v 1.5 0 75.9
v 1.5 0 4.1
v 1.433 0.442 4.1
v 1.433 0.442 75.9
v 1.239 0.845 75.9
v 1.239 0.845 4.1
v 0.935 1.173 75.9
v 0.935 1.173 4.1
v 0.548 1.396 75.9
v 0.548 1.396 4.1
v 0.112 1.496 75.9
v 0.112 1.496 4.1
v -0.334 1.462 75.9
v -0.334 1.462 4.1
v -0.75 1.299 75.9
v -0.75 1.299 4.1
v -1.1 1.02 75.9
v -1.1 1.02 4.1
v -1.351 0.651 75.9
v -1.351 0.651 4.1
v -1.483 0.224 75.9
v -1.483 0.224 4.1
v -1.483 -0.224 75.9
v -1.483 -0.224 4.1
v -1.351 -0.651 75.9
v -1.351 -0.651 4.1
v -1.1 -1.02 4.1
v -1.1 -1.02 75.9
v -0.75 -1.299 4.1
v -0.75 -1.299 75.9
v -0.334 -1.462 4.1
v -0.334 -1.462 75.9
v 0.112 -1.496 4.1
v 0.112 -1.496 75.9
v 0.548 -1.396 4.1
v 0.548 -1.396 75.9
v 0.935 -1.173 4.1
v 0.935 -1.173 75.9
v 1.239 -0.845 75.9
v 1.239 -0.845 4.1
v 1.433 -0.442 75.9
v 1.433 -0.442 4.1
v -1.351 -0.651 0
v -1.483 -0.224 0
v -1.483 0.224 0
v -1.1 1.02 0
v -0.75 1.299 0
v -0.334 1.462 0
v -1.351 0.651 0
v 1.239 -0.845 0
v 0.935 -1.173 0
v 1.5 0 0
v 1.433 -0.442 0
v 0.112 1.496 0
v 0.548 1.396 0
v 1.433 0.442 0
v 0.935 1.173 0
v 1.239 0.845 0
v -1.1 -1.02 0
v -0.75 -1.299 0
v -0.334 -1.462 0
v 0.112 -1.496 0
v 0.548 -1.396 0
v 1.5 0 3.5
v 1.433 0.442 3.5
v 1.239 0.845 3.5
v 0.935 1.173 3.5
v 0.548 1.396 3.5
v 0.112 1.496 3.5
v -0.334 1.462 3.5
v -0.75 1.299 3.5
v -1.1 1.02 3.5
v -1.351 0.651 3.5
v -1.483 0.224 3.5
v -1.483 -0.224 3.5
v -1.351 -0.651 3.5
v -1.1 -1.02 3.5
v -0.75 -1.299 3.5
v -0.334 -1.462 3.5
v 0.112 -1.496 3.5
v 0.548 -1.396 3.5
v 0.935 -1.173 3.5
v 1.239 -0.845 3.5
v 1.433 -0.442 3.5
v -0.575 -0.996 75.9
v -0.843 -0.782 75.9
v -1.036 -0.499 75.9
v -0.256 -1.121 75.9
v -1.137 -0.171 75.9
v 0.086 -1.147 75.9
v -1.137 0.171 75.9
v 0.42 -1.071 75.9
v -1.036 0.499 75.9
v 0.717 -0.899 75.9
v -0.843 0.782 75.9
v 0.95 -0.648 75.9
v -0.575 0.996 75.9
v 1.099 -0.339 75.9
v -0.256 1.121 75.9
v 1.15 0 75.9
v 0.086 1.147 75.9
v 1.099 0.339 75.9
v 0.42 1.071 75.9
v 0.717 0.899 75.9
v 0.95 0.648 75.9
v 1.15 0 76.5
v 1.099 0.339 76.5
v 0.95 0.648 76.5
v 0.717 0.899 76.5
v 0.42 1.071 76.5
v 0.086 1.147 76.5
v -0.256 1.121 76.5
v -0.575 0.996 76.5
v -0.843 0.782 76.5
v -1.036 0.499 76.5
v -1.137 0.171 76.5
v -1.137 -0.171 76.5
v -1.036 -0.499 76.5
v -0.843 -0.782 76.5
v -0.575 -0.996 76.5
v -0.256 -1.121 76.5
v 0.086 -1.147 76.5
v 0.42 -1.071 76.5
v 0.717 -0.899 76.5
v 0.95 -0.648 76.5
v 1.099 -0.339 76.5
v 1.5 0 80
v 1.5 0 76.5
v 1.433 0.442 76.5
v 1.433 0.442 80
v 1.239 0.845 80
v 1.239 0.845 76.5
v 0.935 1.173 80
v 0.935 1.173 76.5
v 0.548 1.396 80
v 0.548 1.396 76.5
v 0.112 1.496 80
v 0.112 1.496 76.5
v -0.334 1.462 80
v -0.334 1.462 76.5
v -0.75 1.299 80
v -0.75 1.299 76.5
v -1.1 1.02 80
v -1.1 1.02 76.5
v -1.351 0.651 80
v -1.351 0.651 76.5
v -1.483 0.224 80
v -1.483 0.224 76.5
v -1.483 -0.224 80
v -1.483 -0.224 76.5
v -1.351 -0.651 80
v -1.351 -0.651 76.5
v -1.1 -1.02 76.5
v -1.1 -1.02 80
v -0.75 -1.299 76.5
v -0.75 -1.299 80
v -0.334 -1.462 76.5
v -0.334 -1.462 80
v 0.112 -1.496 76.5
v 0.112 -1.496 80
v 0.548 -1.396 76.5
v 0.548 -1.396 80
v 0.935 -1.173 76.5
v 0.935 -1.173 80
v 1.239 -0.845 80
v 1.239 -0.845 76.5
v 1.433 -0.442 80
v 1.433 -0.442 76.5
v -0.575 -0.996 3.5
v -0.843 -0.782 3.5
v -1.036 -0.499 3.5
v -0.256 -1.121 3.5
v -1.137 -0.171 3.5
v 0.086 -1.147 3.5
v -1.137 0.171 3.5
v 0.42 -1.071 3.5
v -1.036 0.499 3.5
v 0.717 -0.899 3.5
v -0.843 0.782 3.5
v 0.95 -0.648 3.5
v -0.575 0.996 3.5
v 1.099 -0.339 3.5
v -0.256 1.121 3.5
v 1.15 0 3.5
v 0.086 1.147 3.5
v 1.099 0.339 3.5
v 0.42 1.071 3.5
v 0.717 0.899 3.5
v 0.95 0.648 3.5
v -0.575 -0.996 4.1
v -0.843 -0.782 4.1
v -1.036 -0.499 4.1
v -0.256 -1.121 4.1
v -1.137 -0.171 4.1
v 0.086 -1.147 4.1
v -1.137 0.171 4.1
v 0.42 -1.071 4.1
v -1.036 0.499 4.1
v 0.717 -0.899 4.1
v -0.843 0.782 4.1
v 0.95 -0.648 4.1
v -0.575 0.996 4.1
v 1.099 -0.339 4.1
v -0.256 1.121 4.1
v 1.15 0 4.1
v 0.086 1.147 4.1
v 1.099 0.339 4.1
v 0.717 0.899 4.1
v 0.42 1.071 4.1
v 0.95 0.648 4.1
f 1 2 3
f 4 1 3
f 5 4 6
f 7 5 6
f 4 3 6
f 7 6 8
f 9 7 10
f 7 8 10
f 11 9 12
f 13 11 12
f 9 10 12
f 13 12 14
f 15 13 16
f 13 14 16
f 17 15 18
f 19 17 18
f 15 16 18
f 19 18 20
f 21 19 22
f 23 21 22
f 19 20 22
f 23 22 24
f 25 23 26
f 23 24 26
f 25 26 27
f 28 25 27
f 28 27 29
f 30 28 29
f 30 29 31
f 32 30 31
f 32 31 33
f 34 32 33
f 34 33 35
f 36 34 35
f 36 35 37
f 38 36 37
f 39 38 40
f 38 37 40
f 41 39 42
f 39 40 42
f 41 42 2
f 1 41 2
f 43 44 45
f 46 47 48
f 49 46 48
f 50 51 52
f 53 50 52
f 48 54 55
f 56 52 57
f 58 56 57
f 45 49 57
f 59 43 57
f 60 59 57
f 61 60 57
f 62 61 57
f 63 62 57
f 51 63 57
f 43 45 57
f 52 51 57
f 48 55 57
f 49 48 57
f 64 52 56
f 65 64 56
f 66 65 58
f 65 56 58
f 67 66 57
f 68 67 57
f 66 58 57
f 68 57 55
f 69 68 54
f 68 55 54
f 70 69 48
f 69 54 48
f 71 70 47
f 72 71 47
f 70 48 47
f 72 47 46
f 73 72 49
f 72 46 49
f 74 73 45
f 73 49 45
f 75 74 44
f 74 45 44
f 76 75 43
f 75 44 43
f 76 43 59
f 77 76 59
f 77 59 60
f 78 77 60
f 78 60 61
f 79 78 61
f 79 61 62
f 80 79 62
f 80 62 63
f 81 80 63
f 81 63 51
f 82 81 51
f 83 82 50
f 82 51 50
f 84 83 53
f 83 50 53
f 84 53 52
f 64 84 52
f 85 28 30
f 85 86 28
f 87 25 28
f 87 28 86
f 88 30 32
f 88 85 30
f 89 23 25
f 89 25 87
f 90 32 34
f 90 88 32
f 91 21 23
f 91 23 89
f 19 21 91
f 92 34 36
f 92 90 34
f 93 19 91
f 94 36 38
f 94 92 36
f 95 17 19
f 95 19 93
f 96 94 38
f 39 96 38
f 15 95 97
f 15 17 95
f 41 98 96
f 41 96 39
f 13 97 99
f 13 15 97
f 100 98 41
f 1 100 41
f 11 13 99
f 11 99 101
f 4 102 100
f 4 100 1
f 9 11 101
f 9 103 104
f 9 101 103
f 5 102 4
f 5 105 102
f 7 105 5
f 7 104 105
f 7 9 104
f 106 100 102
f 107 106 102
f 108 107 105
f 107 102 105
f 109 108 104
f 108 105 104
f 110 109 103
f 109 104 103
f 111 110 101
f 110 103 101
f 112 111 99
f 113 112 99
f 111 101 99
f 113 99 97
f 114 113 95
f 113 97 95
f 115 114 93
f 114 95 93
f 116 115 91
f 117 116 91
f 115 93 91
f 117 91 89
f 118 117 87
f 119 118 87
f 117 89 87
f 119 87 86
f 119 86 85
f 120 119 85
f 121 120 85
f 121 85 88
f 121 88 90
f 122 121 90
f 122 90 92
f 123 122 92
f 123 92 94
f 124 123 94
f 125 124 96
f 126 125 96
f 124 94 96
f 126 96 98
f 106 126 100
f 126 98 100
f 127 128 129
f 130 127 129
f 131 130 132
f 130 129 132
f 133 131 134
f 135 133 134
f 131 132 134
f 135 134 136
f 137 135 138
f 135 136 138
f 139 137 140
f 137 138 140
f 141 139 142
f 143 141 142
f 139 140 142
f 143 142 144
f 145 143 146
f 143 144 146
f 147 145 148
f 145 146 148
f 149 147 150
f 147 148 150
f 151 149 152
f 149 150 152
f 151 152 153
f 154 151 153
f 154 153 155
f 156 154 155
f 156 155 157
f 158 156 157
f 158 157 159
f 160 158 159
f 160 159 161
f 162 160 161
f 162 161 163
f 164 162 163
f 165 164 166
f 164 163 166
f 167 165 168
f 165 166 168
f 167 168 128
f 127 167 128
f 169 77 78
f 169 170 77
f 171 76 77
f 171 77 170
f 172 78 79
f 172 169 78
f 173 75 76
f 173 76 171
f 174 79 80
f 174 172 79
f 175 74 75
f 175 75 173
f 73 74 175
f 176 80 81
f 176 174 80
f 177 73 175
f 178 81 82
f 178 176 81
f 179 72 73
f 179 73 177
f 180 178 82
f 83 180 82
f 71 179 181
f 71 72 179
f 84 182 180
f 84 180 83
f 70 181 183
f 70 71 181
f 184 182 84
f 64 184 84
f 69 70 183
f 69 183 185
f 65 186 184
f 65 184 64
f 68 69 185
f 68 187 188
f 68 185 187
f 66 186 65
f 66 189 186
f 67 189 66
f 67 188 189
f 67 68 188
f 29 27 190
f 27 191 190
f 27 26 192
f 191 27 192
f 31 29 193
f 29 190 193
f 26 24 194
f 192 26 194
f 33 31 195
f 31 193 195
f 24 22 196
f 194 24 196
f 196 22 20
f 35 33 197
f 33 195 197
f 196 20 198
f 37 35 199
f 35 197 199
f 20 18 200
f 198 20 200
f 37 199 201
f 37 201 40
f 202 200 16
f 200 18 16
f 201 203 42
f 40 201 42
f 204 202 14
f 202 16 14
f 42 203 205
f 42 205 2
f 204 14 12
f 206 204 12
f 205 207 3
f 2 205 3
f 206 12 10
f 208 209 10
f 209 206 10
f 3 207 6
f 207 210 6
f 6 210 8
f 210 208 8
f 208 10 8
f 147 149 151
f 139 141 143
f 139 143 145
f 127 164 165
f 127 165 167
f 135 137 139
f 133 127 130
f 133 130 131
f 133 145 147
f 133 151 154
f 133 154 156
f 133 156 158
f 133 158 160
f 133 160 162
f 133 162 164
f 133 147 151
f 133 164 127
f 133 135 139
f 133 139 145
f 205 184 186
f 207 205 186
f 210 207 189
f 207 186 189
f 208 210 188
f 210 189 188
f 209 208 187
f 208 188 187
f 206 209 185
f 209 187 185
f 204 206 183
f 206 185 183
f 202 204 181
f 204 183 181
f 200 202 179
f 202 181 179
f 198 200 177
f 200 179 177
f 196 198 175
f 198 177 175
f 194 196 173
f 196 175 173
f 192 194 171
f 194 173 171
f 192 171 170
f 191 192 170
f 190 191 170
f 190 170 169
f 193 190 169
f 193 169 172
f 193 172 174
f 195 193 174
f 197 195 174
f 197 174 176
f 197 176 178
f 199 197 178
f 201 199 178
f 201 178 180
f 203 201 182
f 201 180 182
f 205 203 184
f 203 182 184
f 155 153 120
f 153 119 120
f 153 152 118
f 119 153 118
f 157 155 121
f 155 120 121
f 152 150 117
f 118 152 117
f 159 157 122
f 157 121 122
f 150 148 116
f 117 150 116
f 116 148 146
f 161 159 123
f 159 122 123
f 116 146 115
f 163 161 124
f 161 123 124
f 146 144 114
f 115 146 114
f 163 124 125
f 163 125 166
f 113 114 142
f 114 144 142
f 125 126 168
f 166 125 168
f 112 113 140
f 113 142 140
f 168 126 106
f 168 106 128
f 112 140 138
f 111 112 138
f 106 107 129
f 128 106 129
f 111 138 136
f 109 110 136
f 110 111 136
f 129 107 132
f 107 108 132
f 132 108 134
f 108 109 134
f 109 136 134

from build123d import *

# Parameters (mm, degrees)
SKETCH_1_R      = 1.5
EXTRUDE_1_DEPTH = 3.5
SKETCH_2_R      = 1.15
EXTRUDE_2_DEPTH = 0.6
SKETCH_3_R      = 1.5
EXTRUDE_3_DEPTH = 71.8
SKETCH_4_R      = 1.15
EXTRUDE_4_DEPTH = 0.6
SKETCH_5_R      = 1.5
EXTRUDE_5_DEPTH = 3.5


with BuildPart() as part:
    # 草图1 → 凸台-拉伸1 (new body)
    with BuildSketch(Plane.XY):
        Circle(SKETCH_1_R)
    extrude(amount=EXTRUDE_1_DEPTH)

    # 草图2 → 凸台-拉伸2 (add)
    with BuildSketch(Plane.XY.offset(3.5)):
        Circle(SKETCH_2_R)
    extrude(amount=EXTRUDE_2_DEPTH)

    # 草图3 → 凸台-拉伸3 (add)
    with BuildSketch(Plane.XY.offset(4.1)):
        Circle(SKETCH_3_R)
    extrude(amount=EXTRUDE_3_DEPTH)

    # 草图4 → 凸台-拉伸4 (add)
    with BuildSketch(Plane.XY.offset(75.9)):
        Circle(SKETCH_4_R)
    extrude(amount=EXTRUDE_4_DEPTH)

    # 草图5 → 凸台-拉伸5 (add)
    with BuildSketch(Plane.XY.offset(76.5)):
        Circle(SKETCH_5_R)
    extrude(amount=EXTRUDE_5_DEPTH)


solid = part.part
